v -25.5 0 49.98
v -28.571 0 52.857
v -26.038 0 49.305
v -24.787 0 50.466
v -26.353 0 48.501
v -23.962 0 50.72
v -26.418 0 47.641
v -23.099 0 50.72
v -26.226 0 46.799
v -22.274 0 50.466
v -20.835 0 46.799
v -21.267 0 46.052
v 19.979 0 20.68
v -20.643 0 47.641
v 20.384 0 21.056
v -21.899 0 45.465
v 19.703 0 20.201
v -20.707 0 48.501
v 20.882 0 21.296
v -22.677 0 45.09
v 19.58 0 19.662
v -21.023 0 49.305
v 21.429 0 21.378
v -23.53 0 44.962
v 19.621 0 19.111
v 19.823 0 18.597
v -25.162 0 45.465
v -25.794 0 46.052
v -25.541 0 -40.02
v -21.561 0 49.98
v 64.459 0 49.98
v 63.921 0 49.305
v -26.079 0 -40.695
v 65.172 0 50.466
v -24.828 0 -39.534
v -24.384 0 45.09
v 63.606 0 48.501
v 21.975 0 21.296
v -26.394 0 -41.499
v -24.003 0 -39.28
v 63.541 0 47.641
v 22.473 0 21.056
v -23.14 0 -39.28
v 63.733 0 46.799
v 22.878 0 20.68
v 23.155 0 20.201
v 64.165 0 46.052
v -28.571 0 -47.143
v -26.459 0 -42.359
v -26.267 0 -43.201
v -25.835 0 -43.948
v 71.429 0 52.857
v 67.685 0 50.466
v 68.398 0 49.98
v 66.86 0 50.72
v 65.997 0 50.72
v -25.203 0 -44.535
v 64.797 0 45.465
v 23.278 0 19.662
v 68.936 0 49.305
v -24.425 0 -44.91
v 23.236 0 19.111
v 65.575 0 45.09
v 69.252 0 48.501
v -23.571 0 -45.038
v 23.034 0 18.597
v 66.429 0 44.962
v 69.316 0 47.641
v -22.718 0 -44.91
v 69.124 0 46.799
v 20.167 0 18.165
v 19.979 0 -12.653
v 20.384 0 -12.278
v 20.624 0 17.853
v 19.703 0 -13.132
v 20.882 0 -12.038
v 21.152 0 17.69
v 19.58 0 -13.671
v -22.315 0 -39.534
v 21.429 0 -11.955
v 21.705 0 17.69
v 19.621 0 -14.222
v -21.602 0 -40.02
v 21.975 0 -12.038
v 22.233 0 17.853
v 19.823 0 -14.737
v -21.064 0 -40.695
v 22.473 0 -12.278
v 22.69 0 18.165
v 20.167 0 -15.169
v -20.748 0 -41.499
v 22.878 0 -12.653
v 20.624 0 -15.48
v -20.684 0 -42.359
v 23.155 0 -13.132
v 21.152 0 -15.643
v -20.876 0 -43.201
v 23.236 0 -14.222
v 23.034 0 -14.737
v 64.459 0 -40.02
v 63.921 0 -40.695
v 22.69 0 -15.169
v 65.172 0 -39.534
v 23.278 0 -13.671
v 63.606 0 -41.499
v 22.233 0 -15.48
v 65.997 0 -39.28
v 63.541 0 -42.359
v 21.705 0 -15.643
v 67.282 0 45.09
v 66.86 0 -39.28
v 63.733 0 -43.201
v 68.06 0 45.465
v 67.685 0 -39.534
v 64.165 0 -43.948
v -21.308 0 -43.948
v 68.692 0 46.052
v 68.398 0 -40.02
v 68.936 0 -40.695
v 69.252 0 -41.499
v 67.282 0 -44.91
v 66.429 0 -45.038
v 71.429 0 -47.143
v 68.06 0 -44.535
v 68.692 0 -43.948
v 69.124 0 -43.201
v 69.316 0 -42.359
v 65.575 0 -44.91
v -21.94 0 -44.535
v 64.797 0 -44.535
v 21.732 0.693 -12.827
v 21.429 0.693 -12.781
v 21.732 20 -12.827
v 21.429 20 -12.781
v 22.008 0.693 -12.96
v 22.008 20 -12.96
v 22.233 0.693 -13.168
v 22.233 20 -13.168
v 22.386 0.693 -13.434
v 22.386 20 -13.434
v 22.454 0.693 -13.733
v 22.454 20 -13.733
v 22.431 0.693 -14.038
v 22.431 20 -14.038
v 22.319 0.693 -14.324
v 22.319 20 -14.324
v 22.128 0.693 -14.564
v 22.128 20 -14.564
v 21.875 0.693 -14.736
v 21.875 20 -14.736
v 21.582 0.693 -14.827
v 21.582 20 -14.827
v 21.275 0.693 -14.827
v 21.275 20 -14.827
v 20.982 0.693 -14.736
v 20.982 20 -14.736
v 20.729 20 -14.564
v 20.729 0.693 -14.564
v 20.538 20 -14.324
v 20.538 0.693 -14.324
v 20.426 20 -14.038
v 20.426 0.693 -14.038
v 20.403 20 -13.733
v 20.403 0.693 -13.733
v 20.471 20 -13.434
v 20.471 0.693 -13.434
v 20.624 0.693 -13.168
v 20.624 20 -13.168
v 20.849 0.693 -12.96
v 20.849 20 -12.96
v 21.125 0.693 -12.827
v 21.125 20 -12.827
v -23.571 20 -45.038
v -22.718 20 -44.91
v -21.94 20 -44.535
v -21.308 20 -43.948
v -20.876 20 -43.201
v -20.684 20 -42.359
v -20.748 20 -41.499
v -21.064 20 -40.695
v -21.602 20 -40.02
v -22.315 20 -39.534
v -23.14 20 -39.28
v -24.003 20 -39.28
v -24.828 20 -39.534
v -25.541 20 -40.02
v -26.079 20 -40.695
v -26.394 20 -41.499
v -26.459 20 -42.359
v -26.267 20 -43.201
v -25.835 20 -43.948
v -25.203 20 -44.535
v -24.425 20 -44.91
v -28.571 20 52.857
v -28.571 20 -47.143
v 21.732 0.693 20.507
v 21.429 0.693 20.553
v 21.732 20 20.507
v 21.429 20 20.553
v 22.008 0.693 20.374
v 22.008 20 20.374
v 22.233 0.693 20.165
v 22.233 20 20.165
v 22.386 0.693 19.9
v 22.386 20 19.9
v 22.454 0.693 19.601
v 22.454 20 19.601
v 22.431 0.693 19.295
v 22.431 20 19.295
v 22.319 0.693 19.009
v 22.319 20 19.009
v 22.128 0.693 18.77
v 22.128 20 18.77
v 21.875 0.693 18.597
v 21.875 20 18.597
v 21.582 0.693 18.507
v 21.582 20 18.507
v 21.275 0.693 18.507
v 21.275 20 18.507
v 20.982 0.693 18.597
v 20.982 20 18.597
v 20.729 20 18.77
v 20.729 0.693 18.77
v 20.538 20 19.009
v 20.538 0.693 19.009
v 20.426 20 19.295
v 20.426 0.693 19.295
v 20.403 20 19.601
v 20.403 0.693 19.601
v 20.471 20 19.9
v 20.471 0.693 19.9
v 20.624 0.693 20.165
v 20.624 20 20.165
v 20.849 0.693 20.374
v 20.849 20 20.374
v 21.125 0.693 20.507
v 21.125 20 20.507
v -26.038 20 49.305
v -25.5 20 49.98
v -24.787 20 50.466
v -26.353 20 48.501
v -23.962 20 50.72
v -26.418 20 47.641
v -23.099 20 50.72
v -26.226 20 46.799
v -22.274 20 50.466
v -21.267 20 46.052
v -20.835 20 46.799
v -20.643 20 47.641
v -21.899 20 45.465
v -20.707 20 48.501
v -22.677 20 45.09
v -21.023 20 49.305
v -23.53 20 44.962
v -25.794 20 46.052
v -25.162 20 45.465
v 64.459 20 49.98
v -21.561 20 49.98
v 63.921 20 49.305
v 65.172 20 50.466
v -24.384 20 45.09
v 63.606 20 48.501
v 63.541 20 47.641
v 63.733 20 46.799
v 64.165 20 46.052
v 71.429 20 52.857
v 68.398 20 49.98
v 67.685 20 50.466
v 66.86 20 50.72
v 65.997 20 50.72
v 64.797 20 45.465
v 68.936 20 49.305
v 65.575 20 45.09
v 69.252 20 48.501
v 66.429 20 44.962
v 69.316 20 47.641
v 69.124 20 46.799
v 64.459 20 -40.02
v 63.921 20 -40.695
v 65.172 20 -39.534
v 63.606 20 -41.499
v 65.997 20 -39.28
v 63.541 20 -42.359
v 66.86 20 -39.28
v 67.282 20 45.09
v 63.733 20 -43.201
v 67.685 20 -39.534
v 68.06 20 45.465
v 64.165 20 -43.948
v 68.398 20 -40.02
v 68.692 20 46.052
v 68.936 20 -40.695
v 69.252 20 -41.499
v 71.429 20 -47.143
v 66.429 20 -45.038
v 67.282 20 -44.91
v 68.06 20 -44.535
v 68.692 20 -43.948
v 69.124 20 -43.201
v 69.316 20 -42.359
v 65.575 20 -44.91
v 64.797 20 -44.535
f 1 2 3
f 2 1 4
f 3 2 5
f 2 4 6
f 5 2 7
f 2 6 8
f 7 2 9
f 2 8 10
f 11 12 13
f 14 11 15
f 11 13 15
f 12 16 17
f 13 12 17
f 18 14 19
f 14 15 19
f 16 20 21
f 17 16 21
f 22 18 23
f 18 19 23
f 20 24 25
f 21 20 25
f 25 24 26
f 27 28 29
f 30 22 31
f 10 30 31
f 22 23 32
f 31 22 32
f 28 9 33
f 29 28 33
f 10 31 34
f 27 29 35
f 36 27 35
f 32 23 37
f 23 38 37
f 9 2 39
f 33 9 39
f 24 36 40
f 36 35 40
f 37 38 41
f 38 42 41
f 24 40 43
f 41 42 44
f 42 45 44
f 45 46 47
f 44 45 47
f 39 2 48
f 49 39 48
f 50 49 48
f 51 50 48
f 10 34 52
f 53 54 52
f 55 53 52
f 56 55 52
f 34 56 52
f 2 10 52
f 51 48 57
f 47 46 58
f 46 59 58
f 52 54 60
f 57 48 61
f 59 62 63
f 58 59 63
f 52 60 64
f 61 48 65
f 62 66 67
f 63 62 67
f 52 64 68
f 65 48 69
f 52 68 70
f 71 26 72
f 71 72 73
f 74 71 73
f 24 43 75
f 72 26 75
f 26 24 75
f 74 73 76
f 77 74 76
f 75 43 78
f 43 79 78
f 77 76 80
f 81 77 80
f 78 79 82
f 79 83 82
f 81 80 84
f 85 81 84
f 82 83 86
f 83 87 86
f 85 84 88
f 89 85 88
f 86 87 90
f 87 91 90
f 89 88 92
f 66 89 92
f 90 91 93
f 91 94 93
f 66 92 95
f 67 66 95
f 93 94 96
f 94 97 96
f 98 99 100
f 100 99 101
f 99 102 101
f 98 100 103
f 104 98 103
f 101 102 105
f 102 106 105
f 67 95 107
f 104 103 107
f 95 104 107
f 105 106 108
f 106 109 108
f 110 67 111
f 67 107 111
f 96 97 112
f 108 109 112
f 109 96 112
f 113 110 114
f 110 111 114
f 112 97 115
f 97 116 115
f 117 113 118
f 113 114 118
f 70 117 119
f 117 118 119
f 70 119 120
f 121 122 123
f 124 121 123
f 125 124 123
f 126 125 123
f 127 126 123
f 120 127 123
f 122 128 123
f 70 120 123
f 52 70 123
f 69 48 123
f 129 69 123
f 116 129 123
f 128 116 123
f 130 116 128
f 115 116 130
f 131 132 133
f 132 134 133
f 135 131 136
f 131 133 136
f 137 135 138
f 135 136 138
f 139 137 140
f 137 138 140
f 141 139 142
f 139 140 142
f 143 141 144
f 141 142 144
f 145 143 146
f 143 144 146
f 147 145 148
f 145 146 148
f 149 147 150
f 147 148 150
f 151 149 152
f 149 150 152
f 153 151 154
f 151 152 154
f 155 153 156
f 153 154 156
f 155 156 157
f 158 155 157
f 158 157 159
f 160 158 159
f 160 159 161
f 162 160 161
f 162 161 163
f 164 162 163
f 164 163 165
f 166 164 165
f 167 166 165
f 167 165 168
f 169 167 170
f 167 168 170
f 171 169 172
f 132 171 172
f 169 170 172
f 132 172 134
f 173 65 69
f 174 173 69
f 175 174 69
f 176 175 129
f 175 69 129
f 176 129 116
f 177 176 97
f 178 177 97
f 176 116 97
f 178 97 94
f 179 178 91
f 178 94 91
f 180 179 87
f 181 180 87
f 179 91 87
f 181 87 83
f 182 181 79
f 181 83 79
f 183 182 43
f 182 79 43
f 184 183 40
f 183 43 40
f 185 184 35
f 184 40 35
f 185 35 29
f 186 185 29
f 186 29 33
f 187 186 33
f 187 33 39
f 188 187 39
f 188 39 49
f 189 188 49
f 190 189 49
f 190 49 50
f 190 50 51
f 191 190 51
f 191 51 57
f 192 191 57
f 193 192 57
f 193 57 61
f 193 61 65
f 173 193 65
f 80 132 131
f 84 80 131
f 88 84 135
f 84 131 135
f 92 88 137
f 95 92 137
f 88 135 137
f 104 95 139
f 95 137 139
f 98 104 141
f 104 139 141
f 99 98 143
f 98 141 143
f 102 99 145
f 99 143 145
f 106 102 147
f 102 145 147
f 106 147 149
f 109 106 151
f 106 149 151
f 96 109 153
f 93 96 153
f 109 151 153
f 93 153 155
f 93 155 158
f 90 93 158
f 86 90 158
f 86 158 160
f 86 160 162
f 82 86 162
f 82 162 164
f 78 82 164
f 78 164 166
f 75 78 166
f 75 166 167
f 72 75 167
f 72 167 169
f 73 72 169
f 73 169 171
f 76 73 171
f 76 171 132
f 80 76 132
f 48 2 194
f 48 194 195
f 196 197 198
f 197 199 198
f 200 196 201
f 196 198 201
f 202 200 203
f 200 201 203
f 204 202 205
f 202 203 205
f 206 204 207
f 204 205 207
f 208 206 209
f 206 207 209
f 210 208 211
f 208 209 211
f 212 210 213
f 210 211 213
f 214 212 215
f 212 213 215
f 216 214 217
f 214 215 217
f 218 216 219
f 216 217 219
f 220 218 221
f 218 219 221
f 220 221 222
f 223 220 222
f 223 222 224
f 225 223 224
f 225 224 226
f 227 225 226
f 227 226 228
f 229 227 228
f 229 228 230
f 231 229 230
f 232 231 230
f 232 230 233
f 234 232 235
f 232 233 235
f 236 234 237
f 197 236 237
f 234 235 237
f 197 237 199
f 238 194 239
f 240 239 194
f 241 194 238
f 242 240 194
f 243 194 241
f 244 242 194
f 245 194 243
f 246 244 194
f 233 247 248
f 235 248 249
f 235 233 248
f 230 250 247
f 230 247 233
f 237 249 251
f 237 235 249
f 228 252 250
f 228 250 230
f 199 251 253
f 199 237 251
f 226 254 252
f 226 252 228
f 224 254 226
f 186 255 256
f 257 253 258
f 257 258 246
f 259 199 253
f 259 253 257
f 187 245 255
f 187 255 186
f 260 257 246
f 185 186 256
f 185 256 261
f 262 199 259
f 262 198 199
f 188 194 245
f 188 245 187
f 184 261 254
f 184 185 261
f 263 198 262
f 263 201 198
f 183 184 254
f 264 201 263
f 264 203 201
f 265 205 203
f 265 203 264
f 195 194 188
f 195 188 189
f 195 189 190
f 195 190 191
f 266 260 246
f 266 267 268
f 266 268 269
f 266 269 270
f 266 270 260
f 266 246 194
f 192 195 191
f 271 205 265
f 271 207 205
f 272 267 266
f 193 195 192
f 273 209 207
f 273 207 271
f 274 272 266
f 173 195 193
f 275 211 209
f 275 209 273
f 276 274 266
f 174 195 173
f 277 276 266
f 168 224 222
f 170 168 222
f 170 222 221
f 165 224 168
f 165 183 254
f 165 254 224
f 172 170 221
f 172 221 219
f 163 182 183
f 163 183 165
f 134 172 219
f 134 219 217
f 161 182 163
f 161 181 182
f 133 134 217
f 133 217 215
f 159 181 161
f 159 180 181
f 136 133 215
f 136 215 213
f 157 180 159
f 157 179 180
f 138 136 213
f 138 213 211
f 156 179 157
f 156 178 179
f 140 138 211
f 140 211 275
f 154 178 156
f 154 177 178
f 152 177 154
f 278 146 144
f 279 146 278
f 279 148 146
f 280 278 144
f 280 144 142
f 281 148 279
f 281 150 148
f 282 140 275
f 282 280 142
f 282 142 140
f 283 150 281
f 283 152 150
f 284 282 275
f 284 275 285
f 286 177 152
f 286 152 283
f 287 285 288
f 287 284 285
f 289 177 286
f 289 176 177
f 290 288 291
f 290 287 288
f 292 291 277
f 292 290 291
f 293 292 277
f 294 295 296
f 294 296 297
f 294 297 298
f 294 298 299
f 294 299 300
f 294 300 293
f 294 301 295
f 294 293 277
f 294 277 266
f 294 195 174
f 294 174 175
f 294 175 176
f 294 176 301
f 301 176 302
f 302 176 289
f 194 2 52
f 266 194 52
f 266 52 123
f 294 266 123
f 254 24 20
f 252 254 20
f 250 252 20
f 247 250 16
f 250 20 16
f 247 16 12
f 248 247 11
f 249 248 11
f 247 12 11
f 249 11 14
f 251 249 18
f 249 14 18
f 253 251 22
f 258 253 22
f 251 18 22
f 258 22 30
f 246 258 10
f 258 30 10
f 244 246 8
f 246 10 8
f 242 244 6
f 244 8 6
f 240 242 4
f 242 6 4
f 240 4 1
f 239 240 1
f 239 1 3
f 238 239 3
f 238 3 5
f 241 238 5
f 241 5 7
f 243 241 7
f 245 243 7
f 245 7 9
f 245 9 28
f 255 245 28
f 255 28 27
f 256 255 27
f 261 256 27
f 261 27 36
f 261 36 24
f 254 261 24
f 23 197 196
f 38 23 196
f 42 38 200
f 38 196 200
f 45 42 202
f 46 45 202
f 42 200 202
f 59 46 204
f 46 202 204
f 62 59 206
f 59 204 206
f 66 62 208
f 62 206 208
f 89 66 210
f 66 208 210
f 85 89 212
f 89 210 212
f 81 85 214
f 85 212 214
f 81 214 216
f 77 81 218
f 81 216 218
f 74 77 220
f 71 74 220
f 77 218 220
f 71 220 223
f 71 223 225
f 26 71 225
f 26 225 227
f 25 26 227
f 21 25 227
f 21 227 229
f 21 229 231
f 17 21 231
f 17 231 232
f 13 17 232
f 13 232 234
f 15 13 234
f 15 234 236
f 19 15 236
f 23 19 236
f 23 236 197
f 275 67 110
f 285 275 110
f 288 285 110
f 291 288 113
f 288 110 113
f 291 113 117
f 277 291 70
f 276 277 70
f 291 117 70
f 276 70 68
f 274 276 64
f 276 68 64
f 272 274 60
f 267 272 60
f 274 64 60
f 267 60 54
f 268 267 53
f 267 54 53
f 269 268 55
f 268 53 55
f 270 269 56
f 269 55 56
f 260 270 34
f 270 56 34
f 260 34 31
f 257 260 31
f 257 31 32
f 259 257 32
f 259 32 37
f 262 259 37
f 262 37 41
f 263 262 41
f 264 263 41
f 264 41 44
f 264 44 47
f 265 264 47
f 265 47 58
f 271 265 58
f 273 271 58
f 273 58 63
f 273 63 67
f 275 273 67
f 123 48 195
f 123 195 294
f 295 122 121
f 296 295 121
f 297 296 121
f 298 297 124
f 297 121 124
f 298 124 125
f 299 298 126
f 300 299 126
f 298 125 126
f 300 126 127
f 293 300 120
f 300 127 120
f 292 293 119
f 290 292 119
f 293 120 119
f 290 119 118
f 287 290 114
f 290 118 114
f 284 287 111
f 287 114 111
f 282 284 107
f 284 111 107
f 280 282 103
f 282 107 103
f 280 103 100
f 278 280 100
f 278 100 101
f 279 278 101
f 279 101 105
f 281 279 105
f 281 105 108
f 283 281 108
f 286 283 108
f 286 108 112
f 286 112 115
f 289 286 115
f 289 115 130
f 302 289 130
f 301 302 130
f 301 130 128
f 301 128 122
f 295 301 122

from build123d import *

# Parameters (mm, degrees)
SKETCH1_W                                         = 100
SKETCH1_H                                         = 100
BOSS_EXTRUDE1_DEPTH                               = 20
CSK_FOR_1_FLAT_HEAD_MACHINE_SCREW_100_D           = 2.0574
CSK_FOR_1_FLAT_HEAD_MACHINE_SCREW_100_CSINK_D     = 3.7084
CSK_FOR_1_FLAT_HEAD_MACHINE_SCREW_100_CSINK_ANGLE = 100
F_1_0_228_DIAMETER_HOLE1_D                        = 5.7912


with BuildPart() as part:
    # Sketch1 → Boss-Extrude1 (new body)
    with BuildSketch(Plane(origin=(0, 0, 0), x_dir=(1, 0, 0), z_dir=(0, 1, 0))):
        with Locations((21.428571429, -2.857142857)):
            Rectangle(SKETCH1_W, SKETCH1_H)
    extrude(amount=BOSS_EXTRUDE1_DEPTH)

    # CSK for #1 Flat Head Machine Screw (100)1 (through all)
    with Locations(Plane(origin=(21.428571429, 0, -13.80952381), x_dir=(0, 0, -1), z_dir=(0, -1, 0))):
        with Locations((0, 0), (-33.333333334, 0)):
            CounterSinkHole(CSK_FOR_1_FLAT_HEAD_MACHINE_SCREW_100_D / 2, CSK_FOR_1_FLAT_HEAD_MACHINE_SCREW_100_CSINK_D / 2, counter_sink_angle=CSK_FOR_1_FLAT_HEAD_MACHINE_SCREW_100_CSINK_ANGLE)

    # #1 (0.228) Diameter Hole1 (through all)
    with Locations(Plane(origin=(-23.530488072, 20, 47.857142857), x_dir=(0, 0, 1), z_dir=(0, 1, 0))):
        with Locations((0, 0), (0, 89.959059501), (-90, 89.959059501), (-90, -0.040940499)):
            Hole(F_1_0_228_DIAMETER_HOLE1_D / 2)


solid = part.part
